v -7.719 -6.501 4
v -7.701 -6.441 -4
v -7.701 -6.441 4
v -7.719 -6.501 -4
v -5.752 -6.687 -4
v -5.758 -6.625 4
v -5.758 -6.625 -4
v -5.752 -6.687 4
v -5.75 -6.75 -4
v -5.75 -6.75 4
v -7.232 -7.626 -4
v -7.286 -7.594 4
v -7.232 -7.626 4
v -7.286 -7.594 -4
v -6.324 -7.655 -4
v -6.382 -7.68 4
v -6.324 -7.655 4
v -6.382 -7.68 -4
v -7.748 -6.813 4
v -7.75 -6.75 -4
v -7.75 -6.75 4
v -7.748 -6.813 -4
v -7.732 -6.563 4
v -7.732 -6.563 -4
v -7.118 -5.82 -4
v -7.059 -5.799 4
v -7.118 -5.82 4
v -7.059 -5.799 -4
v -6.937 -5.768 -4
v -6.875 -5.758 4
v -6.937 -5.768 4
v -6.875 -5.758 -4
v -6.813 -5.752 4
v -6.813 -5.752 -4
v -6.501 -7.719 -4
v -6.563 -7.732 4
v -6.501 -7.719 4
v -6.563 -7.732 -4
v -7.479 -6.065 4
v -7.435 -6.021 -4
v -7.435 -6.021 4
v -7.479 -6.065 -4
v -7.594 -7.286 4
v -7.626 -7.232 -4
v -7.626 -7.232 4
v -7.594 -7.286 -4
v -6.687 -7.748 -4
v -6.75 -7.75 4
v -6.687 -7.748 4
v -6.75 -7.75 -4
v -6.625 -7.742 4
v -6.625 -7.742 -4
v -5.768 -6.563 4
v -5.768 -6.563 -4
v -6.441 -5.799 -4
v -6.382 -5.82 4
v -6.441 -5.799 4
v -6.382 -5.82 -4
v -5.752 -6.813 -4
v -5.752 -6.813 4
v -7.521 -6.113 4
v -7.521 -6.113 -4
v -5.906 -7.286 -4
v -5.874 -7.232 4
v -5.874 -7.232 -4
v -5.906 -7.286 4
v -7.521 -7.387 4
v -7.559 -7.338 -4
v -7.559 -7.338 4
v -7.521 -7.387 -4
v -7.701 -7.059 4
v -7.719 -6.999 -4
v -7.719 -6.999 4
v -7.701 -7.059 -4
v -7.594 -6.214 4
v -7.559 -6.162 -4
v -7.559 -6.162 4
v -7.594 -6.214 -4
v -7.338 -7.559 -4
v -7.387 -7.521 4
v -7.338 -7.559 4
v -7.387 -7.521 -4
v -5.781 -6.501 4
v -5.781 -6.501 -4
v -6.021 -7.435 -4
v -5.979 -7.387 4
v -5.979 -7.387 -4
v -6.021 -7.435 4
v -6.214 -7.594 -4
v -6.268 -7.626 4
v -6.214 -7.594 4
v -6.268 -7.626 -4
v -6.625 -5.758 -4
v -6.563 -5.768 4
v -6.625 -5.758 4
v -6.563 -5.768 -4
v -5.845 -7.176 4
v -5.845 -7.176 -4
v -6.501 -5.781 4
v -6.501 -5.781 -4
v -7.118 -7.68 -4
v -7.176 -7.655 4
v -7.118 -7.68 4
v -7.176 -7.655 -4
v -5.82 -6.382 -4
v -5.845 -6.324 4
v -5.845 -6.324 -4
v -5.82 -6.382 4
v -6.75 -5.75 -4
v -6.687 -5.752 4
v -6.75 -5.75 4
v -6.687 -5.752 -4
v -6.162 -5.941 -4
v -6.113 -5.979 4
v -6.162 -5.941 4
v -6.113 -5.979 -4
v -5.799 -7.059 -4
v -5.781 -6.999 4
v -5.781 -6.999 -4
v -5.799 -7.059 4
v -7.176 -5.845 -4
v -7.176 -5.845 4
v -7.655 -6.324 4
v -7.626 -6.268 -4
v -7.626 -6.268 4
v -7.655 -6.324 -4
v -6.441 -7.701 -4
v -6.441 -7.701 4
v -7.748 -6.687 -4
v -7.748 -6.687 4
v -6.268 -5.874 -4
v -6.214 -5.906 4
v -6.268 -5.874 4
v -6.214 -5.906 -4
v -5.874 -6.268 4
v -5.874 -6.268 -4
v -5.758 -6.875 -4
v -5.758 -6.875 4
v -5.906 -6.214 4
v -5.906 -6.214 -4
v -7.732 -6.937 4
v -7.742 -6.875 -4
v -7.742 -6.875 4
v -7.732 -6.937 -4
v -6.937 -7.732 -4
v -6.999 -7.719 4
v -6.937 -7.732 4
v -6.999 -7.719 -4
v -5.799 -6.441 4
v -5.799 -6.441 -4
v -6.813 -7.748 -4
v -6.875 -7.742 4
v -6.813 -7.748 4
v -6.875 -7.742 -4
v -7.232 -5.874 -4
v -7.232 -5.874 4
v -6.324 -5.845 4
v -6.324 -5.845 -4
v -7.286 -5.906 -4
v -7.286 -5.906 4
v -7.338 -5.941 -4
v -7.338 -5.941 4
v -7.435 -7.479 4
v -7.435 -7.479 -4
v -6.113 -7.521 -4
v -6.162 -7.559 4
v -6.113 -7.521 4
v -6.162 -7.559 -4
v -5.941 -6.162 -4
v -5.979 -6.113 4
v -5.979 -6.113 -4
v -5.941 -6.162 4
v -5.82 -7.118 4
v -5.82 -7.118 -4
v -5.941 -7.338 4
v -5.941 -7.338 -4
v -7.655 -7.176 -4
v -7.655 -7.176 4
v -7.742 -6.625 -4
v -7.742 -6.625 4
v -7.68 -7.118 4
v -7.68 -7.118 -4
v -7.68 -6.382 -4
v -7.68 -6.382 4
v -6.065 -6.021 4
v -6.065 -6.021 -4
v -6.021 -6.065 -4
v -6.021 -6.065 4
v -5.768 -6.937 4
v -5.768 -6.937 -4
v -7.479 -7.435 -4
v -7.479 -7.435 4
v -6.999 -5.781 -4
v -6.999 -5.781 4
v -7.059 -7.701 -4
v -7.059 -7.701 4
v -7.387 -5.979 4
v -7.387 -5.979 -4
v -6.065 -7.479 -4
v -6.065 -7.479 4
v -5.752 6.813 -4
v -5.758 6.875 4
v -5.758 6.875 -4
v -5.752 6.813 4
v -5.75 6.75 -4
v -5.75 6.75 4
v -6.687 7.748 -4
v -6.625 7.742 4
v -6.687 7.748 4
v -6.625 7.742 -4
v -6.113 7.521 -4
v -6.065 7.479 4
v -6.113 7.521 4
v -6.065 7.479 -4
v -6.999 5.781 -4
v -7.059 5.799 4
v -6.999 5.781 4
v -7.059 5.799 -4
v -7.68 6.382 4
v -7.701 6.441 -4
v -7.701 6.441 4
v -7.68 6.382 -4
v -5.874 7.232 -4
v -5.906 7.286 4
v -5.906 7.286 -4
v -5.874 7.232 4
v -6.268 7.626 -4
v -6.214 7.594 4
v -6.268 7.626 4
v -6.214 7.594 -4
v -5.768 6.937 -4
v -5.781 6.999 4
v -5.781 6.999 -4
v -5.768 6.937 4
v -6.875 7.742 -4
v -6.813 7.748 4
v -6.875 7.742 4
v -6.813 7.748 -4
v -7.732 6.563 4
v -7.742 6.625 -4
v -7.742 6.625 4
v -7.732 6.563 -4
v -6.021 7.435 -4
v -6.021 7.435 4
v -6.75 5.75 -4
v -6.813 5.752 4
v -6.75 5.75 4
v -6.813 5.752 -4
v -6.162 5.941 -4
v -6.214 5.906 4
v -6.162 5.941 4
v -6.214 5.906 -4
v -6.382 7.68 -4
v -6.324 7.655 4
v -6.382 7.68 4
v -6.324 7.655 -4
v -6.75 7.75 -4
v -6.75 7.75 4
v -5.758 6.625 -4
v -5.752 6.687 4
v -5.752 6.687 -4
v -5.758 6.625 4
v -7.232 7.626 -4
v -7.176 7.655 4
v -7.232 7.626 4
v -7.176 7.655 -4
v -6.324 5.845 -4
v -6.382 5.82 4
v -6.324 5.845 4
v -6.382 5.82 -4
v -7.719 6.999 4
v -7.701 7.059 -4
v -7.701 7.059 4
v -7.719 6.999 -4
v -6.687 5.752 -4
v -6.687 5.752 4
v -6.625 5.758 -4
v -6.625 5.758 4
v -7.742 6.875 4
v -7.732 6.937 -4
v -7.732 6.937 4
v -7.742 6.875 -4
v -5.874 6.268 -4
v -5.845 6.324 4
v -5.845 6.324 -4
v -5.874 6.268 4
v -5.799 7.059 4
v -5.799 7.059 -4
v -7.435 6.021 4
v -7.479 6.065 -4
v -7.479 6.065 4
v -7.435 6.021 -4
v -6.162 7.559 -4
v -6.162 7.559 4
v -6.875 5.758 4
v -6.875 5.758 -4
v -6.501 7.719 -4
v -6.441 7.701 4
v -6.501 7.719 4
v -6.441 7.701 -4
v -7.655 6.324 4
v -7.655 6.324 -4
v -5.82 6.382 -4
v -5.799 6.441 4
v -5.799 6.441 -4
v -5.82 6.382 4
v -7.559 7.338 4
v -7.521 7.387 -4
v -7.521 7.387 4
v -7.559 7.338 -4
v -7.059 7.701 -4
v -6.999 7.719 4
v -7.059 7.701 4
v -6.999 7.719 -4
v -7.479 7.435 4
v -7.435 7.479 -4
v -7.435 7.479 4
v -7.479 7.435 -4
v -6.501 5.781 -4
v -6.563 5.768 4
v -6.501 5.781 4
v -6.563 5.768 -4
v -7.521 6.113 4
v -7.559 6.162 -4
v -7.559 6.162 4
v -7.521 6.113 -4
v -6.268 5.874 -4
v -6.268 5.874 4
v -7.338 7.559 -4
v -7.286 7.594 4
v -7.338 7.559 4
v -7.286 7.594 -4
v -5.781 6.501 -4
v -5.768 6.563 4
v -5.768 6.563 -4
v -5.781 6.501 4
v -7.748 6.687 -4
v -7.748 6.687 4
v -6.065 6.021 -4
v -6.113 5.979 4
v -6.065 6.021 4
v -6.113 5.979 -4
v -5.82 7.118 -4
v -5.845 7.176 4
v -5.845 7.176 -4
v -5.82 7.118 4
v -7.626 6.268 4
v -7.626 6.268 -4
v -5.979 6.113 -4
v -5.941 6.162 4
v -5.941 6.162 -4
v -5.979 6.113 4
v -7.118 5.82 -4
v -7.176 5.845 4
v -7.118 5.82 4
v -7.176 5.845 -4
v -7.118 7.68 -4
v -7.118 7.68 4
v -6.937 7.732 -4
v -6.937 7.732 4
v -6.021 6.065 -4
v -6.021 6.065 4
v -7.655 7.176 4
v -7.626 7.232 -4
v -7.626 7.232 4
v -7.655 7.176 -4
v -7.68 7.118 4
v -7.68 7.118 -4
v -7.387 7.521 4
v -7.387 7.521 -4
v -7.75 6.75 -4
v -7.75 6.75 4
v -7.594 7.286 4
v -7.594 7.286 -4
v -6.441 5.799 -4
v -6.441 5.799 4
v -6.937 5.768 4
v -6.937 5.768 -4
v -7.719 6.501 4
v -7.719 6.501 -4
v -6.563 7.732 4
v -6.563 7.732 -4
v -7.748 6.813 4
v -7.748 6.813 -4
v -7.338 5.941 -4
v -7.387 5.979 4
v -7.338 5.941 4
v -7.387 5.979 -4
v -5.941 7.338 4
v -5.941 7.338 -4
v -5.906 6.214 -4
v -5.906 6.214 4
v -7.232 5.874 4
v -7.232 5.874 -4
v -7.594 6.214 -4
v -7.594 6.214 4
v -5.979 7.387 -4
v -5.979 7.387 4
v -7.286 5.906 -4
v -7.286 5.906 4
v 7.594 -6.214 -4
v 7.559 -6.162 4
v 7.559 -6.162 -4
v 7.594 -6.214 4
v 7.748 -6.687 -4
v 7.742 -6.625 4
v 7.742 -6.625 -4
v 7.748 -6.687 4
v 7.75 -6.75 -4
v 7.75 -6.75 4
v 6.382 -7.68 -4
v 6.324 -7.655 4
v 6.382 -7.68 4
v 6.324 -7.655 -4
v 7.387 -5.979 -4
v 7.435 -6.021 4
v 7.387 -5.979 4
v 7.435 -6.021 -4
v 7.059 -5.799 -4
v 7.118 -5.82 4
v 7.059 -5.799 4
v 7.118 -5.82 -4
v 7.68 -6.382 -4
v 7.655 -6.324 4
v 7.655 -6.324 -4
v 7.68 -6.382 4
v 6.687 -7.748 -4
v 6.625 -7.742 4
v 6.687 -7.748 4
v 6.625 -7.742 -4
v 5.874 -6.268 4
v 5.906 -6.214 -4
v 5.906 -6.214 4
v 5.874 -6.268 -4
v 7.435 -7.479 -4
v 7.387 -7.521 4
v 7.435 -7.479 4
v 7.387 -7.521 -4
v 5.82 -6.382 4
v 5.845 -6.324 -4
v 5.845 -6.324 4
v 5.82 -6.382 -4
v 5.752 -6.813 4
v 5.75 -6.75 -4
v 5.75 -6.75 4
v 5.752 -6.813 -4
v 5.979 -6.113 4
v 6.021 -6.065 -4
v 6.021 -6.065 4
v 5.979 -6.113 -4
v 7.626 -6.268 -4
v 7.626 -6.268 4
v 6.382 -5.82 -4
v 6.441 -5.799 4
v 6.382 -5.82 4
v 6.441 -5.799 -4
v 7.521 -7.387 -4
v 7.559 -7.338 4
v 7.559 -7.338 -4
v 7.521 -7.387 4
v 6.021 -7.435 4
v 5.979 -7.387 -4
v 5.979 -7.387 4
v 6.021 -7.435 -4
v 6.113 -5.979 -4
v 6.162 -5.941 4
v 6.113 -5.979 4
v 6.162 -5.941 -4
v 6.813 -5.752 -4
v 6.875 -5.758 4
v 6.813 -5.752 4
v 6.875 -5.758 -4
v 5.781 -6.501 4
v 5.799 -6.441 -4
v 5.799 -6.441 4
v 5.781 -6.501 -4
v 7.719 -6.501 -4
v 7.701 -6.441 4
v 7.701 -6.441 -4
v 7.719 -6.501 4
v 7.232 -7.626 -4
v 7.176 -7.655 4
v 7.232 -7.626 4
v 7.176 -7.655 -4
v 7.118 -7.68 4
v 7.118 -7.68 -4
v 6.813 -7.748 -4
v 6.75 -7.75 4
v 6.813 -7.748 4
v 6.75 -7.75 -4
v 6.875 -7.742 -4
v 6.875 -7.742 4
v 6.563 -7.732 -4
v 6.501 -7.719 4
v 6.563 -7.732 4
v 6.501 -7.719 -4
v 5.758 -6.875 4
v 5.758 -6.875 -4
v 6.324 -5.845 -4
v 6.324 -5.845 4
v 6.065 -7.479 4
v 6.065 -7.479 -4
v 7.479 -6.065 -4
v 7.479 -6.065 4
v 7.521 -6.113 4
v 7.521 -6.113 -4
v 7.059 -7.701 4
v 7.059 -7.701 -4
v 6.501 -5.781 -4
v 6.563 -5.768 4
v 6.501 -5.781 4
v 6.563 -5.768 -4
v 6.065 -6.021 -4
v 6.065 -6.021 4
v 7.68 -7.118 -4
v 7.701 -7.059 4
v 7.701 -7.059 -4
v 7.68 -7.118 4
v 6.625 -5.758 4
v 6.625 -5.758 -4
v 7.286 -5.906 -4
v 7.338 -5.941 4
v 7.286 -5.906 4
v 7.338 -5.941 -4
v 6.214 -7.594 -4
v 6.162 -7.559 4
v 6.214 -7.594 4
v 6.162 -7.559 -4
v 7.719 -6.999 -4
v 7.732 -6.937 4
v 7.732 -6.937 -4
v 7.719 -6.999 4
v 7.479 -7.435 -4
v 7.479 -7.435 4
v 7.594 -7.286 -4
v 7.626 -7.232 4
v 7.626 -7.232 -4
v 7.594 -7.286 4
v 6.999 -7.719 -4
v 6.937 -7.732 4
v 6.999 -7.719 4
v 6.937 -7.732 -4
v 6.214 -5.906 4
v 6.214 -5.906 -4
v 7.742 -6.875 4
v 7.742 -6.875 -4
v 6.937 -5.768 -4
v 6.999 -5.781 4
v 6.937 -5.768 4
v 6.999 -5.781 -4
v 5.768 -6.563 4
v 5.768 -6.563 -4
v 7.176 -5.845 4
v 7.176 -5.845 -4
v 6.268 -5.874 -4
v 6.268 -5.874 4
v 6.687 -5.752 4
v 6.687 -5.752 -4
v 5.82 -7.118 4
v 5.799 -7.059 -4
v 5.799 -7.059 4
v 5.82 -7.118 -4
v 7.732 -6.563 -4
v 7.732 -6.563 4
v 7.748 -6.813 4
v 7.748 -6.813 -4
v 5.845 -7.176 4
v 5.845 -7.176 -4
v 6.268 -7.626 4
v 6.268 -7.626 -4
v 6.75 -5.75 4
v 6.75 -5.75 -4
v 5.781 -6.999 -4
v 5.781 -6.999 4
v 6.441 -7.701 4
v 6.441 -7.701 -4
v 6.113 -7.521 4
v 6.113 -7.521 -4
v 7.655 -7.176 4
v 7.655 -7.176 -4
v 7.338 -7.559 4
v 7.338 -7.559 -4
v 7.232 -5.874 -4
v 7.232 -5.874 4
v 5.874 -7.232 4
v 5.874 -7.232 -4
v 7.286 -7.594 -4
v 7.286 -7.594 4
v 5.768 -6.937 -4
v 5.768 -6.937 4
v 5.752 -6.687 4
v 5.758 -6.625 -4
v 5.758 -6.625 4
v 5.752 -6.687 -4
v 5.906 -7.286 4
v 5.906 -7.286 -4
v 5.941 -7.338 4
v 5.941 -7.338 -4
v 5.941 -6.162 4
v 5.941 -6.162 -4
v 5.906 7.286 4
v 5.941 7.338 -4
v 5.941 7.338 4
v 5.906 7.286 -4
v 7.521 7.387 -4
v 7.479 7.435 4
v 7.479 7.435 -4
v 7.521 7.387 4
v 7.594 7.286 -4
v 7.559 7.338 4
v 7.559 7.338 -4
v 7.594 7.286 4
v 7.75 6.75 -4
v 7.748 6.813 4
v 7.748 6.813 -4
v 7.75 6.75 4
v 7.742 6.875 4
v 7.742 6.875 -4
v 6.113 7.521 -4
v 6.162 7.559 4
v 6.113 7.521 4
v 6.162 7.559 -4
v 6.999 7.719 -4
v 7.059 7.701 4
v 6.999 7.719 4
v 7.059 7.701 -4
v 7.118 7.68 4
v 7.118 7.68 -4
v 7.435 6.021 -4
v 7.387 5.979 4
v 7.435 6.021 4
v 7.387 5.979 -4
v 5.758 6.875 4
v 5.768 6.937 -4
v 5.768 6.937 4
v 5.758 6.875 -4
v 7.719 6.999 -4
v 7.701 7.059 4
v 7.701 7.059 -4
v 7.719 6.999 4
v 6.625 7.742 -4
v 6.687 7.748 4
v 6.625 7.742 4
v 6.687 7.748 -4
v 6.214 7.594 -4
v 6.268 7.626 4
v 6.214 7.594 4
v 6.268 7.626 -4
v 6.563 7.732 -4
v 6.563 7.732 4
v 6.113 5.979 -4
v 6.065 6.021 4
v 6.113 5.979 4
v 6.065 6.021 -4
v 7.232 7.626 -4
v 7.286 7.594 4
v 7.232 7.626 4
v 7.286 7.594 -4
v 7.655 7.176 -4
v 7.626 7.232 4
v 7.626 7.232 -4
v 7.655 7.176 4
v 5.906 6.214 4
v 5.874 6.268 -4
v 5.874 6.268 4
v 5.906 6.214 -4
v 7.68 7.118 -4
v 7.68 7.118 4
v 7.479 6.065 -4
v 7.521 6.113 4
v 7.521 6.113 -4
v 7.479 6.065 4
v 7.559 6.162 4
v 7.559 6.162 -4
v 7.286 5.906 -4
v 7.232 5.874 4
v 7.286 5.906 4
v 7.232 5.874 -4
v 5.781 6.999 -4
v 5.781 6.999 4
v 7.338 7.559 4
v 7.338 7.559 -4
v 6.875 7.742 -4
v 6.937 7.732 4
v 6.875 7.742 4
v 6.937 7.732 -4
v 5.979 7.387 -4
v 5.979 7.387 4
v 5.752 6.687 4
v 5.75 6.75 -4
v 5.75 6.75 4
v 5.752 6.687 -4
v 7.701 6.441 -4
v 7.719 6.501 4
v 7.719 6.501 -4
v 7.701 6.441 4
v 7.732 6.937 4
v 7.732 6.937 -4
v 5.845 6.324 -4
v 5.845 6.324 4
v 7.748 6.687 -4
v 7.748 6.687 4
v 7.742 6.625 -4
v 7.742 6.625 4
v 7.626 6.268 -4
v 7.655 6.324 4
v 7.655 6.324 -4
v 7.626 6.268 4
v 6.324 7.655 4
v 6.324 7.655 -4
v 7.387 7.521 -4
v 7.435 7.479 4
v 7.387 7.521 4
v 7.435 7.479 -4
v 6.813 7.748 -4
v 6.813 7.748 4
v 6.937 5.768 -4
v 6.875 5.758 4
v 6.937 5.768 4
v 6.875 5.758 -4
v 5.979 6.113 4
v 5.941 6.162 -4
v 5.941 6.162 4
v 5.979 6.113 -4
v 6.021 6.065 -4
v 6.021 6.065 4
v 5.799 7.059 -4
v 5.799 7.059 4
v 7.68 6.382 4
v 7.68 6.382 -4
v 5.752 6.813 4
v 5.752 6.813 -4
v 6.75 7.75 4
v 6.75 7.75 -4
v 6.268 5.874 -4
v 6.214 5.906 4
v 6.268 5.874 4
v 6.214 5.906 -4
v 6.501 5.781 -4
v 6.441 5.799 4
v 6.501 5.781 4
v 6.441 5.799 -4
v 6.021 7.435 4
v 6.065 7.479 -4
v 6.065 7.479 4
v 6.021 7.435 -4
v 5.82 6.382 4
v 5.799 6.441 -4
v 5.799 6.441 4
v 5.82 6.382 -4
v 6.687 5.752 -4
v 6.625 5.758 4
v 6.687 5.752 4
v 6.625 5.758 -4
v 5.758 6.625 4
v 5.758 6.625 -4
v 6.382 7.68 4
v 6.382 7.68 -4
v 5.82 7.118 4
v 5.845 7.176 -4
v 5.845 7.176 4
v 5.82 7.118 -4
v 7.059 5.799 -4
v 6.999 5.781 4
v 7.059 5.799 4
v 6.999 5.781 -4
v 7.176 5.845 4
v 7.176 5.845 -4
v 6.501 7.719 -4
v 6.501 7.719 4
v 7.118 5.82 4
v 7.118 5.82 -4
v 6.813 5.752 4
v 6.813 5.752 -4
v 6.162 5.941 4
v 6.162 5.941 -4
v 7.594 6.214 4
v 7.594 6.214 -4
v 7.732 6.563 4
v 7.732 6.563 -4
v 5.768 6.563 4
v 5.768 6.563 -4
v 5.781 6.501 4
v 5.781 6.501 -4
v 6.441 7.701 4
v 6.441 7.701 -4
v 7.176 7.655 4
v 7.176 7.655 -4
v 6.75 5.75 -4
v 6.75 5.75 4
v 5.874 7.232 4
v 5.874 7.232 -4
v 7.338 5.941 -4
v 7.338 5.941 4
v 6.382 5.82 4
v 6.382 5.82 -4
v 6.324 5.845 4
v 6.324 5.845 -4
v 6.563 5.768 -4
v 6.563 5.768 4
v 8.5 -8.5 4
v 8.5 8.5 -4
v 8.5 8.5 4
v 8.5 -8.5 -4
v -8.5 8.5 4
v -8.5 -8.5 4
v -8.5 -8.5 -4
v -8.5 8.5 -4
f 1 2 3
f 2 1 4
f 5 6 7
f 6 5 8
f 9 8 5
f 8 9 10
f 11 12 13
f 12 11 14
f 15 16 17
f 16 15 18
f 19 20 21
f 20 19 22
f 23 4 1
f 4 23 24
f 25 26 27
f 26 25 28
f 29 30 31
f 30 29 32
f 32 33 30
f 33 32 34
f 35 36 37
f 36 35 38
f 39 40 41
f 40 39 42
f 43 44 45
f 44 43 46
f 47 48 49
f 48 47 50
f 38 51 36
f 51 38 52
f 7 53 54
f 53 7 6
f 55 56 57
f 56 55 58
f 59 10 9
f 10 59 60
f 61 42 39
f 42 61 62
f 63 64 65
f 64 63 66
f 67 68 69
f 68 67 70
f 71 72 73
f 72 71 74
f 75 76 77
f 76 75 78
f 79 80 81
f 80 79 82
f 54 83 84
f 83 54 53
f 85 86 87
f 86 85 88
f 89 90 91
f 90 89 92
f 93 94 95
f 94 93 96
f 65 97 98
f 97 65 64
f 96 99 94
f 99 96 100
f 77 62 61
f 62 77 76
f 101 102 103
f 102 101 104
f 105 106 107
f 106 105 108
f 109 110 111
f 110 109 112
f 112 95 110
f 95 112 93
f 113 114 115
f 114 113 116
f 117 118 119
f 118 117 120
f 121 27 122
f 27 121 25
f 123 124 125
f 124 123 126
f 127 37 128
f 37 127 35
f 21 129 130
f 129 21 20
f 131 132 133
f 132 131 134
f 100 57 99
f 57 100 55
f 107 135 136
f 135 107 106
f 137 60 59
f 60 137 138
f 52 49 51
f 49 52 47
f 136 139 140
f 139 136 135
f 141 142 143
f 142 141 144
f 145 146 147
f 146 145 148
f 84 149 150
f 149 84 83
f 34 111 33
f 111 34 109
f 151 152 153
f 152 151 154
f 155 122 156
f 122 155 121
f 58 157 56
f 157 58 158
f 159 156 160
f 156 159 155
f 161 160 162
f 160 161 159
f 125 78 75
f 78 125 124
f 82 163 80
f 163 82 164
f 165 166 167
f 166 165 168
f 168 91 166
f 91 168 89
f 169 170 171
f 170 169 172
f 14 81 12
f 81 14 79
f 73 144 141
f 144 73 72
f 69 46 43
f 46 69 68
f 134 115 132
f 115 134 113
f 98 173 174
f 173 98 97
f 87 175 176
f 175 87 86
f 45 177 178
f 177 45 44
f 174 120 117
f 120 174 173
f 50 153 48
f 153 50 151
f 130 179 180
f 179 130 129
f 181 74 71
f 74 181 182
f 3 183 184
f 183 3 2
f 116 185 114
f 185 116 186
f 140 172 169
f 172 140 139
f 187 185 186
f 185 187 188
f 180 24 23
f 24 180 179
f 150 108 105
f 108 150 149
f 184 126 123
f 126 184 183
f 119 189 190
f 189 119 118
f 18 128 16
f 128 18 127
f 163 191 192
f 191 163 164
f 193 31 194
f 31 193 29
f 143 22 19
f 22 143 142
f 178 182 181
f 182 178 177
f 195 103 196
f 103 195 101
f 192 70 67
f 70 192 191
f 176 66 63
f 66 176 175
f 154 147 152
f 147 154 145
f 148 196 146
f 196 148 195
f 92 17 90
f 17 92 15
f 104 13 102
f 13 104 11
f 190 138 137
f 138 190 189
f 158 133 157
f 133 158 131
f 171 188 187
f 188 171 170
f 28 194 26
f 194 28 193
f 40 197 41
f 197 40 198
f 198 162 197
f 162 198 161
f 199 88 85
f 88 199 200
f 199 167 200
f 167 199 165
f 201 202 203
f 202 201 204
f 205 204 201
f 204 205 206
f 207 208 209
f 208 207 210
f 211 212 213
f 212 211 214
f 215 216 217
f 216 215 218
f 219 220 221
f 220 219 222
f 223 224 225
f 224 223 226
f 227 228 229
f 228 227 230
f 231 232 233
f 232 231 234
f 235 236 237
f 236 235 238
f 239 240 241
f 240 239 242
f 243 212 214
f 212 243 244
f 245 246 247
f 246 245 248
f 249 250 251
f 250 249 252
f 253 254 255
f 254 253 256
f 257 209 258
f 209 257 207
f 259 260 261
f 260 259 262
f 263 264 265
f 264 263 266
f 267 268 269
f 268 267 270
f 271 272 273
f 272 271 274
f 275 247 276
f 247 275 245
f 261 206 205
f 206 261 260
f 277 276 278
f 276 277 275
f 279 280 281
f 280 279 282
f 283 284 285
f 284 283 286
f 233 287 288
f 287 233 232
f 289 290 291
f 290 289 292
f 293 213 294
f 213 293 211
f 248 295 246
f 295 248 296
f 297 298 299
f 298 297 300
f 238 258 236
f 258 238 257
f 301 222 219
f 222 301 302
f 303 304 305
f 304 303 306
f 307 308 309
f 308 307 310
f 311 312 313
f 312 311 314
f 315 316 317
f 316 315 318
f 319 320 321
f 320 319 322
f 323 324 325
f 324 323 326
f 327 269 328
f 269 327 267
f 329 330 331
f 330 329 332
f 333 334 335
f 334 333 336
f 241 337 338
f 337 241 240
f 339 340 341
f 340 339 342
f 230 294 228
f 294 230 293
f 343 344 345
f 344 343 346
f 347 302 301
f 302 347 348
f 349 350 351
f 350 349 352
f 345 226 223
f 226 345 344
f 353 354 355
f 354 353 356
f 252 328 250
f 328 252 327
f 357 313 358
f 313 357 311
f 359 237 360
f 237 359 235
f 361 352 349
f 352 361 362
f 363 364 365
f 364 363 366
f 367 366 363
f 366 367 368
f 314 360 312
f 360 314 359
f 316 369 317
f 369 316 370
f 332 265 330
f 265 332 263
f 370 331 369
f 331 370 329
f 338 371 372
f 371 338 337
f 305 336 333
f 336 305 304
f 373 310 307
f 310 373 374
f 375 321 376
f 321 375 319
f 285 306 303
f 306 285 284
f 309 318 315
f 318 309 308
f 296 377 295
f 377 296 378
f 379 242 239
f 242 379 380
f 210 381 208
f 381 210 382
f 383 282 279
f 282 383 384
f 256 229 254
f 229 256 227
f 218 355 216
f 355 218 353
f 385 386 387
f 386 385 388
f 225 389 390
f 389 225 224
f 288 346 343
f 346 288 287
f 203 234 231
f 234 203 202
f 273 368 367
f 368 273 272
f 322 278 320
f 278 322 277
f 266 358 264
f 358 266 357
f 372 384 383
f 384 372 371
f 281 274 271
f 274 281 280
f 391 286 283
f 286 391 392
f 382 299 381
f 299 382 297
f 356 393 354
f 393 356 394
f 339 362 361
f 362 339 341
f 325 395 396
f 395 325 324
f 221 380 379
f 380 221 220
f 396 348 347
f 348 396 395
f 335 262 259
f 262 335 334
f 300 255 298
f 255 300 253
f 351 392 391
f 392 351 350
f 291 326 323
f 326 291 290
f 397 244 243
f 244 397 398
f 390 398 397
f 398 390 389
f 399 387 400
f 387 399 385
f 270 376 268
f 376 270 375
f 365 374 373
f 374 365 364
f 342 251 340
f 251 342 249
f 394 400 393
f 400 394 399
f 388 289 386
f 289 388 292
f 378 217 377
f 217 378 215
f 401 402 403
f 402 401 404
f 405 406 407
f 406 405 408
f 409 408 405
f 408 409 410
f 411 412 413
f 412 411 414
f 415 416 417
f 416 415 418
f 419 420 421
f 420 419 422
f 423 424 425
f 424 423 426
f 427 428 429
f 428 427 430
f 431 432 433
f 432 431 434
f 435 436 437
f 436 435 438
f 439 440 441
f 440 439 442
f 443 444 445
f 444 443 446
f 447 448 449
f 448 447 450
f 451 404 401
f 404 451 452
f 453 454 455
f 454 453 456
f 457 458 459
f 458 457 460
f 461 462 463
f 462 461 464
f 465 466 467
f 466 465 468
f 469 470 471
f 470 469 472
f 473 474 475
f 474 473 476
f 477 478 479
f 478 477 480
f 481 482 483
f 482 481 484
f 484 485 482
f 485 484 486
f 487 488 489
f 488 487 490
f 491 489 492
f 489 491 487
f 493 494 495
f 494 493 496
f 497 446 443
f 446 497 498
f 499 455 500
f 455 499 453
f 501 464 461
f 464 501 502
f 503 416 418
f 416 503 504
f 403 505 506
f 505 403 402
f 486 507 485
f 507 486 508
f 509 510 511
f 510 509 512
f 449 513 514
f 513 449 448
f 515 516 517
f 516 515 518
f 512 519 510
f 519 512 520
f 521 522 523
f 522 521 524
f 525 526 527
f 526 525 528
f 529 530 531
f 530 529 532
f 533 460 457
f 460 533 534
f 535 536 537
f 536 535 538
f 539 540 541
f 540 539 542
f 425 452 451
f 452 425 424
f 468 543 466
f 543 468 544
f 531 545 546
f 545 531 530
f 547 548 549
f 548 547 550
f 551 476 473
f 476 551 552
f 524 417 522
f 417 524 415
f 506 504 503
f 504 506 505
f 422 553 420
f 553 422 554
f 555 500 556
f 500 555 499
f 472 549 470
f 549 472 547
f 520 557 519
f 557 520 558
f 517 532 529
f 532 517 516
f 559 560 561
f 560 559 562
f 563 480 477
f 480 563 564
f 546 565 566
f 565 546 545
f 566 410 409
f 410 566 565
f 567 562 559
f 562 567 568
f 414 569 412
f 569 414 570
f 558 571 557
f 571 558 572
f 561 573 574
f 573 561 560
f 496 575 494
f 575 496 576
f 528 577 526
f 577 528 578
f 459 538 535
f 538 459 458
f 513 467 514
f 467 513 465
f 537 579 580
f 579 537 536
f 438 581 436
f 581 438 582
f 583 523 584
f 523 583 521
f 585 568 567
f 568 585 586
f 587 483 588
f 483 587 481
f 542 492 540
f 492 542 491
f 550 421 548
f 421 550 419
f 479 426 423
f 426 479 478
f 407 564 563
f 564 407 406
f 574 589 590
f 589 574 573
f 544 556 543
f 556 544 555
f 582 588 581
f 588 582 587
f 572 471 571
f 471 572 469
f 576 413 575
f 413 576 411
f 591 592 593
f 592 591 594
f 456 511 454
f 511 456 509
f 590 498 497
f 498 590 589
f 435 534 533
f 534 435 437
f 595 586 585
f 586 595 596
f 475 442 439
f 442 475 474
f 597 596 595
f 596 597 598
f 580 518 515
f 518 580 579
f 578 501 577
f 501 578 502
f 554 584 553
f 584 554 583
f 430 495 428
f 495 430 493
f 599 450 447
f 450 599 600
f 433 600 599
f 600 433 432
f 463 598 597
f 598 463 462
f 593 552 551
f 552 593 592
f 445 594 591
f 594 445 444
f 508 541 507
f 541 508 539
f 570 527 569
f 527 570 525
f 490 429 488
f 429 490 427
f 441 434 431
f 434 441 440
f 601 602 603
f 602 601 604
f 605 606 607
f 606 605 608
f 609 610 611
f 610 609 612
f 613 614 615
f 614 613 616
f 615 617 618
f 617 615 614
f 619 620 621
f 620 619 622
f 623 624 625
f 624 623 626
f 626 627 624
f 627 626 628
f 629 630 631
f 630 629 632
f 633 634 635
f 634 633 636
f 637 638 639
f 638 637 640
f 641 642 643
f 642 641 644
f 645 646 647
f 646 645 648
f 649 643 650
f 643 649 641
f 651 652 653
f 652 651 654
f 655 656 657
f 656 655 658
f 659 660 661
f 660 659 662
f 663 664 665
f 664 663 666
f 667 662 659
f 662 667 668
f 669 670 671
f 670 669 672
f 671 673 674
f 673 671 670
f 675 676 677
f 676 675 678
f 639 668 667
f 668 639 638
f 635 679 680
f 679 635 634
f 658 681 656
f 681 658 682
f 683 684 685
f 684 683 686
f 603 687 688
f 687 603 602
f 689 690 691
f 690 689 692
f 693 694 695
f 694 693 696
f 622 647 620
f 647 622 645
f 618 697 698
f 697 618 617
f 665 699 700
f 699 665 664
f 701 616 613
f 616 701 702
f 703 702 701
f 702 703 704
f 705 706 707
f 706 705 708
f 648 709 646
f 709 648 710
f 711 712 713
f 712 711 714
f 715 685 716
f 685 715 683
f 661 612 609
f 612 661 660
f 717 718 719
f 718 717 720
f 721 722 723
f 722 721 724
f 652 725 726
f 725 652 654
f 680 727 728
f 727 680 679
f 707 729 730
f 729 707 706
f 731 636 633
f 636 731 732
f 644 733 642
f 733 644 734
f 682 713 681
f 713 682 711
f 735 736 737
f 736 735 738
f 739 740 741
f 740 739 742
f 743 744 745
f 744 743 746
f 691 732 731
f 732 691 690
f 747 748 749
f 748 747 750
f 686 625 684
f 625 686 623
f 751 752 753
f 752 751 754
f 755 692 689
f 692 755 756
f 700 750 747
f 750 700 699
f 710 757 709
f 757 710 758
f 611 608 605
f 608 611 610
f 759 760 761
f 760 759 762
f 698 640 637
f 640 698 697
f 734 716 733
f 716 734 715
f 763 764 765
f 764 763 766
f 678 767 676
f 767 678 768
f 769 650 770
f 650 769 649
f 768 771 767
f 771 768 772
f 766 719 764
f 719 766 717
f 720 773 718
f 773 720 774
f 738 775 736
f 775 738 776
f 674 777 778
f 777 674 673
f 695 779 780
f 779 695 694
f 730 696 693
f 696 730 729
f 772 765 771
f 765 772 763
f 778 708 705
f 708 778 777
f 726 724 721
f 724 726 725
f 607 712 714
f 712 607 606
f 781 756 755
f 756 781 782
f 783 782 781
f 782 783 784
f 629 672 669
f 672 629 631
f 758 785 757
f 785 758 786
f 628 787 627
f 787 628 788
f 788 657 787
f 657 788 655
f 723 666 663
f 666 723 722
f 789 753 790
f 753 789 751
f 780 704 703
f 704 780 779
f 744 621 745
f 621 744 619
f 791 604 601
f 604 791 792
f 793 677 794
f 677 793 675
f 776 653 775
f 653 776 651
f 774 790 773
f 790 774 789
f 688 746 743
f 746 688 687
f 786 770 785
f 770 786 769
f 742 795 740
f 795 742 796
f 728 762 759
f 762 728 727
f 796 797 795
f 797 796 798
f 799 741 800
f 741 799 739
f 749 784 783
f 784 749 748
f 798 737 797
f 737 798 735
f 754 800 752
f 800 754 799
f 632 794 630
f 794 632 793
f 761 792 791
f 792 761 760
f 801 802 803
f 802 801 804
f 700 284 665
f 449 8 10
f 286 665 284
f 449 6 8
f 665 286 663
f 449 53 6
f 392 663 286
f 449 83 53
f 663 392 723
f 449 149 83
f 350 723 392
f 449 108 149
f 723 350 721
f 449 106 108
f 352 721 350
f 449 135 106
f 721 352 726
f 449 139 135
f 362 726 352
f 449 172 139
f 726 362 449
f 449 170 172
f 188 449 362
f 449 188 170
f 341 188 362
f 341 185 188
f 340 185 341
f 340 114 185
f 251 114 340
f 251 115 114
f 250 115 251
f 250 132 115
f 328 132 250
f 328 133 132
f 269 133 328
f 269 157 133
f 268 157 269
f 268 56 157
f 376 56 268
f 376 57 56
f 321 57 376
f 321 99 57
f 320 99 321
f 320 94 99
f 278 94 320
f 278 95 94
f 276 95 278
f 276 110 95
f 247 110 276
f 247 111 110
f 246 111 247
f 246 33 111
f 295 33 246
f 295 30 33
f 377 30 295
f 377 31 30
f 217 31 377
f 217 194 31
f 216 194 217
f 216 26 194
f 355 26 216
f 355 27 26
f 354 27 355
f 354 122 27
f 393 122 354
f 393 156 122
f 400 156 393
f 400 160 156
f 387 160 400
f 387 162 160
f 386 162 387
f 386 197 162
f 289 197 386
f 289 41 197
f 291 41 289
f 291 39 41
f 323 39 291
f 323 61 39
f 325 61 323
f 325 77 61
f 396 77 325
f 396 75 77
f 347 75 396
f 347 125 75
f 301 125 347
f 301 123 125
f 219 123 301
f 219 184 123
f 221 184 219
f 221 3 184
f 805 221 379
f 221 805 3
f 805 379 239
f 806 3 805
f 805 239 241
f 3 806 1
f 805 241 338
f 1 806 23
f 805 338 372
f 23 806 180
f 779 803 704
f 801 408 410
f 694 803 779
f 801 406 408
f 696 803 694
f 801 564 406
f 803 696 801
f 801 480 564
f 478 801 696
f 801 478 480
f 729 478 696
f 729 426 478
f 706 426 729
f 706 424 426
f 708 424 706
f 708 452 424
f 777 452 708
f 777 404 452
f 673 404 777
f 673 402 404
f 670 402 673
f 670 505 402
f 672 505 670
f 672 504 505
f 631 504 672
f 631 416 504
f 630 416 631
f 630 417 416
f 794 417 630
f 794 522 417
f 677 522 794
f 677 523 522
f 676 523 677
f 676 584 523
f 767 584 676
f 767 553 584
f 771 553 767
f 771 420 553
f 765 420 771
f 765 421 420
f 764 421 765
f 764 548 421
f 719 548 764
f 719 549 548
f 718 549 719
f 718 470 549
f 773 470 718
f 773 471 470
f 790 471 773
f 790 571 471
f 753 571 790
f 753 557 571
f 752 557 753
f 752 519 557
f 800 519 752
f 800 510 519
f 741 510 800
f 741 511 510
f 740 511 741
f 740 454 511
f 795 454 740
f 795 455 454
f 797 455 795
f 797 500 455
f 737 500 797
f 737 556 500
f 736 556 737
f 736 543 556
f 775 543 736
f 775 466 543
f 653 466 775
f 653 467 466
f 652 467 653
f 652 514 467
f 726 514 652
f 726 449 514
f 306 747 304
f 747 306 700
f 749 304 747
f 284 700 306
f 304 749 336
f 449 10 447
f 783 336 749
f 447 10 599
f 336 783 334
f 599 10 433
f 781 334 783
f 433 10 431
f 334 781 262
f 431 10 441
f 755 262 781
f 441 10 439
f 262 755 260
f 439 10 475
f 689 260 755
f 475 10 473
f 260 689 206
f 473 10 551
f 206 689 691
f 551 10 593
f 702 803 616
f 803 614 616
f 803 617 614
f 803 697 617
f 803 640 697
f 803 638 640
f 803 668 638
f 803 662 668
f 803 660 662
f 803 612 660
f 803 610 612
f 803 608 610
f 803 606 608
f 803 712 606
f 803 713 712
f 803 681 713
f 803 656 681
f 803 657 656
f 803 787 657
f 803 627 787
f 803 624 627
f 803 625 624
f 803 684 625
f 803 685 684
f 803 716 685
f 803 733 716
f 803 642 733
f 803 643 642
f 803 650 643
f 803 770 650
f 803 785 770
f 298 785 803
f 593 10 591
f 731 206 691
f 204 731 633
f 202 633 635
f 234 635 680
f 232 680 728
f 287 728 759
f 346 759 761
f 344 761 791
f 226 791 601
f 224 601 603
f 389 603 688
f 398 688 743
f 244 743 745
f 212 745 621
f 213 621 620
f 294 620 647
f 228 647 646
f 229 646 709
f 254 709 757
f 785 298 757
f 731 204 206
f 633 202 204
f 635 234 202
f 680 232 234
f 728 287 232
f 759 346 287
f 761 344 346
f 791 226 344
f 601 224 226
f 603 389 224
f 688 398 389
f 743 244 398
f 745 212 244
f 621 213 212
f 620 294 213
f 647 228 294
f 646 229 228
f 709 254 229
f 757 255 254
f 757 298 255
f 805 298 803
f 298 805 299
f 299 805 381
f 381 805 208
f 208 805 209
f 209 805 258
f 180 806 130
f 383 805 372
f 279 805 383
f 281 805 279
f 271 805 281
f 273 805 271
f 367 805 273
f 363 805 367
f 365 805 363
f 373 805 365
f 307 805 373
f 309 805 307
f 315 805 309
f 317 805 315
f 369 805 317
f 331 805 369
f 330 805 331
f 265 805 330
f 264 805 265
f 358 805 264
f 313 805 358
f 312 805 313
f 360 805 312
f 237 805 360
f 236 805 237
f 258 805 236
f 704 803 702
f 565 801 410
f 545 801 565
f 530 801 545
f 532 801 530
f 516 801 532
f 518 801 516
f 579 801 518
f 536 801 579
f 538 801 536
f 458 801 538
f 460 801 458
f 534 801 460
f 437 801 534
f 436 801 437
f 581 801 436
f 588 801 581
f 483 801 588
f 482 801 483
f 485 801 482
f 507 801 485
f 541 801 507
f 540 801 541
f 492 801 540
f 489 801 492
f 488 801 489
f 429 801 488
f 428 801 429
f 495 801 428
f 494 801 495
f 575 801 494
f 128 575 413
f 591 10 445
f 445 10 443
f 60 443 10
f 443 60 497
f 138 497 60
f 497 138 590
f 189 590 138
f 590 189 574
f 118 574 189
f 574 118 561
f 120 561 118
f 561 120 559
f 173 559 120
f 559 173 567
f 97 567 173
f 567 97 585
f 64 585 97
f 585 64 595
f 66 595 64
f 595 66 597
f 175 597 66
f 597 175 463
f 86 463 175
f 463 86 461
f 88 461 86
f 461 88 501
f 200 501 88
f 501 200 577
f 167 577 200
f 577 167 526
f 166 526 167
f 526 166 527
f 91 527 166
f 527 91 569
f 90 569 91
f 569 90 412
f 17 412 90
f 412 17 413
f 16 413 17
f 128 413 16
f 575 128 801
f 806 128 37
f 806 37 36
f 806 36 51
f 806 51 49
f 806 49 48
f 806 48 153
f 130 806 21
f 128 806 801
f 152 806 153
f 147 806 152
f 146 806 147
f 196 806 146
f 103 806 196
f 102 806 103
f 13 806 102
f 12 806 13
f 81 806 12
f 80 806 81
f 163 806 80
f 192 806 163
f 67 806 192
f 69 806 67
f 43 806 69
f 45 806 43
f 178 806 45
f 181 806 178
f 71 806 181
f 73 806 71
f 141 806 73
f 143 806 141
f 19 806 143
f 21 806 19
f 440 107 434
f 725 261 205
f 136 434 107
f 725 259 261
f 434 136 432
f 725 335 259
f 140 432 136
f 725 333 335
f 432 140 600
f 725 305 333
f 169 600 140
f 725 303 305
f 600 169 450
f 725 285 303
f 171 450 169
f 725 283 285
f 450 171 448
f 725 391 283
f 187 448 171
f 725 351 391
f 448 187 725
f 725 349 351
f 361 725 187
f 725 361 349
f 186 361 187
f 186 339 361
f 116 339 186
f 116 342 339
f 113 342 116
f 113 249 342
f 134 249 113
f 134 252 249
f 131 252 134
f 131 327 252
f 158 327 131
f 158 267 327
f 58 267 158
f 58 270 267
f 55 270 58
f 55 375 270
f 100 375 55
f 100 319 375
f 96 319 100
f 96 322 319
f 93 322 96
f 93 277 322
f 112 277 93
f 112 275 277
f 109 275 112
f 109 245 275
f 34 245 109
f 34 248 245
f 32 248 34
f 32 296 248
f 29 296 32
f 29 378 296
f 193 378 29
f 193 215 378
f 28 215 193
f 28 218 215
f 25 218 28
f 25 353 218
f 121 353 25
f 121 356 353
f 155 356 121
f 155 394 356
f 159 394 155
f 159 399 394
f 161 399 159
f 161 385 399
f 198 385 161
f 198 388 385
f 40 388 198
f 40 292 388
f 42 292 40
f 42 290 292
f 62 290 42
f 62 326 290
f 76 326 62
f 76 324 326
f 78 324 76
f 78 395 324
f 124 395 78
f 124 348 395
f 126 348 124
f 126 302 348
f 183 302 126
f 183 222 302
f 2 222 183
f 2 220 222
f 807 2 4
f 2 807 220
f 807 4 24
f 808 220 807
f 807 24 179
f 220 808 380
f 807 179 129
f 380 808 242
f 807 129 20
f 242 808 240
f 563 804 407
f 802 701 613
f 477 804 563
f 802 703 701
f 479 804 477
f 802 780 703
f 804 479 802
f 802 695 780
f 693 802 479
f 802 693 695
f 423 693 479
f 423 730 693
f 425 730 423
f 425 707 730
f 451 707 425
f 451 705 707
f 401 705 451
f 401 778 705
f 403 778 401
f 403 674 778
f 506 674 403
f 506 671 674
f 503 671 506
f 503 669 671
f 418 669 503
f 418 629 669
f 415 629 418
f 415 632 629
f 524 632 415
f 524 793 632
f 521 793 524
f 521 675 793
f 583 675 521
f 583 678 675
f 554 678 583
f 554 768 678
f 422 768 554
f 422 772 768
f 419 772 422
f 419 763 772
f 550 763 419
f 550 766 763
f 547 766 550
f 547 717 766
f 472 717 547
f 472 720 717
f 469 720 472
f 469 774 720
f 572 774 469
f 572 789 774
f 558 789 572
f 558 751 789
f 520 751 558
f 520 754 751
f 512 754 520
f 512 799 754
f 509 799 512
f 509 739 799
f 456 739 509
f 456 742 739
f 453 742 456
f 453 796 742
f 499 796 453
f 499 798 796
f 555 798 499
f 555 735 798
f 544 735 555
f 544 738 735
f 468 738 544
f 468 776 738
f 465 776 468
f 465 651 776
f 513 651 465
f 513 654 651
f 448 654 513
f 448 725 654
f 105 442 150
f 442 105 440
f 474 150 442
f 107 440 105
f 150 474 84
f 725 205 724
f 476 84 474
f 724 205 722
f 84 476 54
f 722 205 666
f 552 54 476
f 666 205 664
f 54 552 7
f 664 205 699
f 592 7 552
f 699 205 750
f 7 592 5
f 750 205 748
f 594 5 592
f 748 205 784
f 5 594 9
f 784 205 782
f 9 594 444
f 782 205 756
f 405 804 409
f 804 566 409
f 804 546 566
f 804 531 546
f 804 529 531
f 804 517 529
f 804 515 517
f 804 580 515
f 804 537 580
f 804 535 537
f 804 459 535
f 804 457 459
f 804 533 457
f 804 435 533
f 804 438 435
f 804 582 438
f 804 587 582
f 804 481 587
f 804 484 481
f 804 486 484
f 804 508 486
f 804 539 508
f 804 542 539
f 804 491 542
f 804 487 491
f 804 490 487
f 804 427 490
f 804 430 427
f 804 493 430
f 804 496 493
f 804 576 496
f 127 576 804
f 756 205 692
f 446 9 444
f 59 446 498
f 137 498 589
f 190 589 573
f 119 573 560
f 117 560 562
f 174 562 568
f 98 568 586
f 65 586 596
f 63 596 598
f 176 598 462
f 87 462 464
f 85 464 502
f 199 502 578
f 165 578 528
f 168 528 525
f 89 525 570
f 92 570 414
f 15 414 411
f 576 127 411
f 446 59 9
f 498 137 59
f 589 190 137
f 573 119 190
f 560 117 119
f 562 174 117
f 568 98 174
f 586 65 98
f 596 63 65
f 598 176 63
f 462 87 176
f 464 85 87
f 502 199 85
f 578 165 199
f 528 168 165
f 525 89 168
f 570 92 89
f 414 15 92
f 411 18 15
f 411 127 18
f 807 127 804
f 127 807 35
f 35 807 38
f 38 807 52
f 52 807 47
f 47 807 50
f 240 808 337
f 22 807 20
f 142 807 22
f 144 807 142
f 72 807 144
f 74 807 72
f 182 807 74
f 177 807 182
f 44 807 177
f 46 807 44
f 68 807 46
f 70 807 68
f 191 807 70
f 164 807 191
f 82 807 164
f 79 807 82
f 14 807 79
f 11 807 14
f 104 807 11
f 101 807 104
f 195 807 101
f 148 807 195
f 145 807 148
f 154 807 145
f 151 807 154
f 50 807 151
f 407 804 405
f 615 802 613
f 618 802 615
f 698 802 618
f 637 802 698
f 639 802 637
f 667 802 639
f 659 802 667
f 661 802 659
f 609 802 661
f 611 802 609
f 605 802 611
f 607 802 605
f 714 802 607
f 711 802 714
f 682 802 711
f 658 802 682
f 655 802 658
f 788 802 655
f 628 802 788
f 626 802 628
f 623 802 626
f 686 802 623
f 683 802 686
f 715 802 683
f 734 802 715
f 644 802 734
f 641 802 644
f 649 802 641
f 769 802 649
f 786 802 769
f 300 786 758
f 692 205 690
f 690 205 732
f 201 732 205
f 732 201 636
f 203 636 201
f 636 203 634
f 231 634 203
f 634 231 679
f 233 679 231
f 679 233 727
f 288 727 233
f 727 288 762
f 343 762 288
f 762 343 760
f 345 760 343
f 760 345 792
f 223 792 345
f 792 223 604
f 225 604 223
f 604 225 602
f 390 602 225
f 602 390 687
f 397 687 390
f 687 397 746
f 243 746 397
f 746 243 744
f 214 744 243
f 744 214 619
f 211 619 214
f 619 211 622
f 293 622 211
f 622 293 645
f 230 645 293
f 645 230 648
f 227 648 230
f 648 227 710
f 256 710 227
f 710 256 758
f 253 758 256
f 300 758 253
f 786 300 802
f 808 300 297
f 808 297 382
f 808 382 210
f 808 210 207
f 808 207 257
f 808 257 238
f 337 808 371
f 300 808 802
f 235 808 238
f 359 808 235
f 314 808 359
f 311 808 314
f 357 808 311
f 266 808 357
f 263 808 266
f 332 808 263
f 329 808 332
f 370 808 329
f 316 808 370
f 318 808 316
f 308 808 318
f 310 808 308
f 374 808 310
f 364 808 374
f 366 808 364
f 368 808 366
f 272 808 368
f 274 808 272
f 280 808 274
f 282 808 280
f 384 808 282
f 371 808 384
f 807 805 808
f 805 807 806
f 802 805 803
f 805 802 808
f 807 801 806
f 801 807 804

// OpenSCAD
// http://www.digikey.com/product-detail/en/copal-electronics-inc/F17HA-05MC/563-1108-ND/1165502
module make_fan_F17HA_05MC(){
    difference(){
        cube([17,17,8], center=true);
        color("red")
        for(i=[-1:2:1]) for(j=[-1:2:1])
        translate([13.5/2*i,13.5/2*j,0])
        cylinder(d=2, h=10, center=true, $fn=100);
    }
}

make_fan_F17HA_05MC();
